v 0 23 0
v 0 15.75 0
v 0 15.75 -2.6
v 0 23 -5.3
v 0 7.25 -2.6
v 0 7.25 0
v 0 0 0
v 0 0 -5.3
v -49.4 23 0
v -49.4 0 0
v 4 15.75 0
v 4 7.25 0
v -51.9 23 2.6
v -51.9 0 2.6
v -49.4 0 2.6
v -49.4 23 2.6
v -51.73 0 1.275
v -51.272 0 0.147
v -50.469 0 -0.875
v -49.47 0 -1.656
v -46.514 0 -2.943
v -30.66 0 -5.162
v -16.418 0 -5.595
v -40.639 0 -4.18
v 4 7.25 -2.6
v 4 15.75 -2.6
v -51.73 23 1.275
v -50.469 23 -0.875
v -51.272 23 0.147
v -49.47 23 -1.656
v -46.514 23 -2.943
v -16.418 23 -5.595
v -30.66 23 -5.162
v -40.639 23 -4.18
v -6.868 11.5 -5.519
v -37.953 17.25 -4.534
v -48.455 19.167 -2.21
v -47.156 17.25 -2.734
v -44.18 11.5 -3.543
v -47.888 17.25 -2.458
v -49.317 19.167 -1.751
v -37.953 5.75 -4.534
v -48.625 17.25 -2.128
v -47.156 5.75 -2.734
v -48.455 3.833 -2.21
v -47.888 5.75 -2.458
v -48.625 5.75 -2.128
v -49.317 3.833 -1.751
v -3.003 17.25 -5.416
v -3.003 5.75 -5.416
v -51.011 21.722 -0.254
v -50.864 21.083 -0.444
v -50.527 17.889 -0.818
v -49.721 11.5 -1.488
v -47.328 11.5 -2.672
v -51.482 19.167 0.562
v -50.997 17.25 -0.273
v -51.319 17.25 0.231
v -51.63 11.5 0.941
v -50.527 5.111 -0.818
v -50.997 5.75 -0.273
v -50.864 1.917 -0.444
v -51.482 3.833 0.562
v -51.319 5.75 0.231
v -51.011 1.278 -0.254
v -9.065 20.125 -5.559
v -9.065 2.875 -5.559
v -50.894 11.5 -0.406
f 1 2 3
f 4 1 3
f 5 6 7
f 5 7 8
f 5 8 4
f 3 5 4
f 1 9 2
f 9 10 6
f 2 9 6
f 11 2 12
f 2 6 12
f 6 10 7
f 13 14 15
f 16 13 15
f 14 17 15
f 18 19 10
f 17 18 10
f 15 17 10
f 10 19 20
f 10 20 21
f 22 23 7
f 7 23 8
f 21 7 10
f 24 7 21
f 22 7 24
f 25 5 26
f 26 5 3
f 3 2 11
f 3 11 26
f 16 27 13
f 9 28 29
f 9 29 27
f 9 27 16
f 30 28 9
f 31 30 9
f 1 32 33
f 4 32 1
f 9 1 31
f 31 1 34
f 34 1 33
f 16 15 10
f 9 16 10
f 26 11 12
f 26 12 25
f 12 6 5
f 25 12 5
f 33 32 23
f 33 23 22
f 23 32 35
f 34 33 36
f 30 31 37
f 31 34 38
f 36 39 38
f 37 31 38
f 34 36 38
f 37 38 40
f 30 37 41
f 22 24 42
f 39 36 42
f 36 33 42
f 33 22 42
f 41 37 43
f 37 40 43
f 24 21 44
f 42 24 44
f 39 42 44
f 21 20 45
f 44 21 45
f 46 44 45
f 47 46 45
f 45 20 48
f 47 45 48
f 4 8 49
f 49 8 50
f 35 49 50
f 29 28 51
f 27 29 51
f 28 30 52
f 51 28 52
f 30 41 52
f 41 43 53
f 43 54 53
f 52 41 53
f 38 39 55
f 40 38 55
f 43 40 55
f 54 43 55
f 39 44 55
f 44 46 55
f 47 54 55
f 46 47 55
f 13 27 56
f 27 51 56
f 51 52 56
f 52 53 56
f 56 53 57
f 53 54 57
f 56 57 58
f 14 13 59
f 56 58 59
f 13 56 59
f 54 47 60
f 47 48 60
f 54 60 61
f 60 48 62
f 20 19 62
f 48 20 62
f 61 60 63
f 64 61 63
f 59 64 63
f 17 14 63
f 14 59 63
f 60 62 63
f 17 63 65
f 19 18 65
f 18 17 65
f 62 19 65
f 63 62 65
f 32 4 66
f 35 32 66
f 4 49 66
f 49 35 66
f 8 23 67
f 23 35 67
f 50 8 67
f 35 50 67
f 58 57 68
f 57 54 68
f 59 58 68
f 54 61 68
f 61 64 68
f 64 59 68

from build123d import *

# Parameters (mm, degrees)
EXTRUDE_1_DEPTH = 23
SKETCH_2_W      = 2.6
SKETCH_2_H      = 8.5
EXTRUDE_2_DEPTH = 4


with BuildPart() as part:
    # Эскиз1 → Бобышка-Вытянуть1 (new body)
    with BuildSketch(Plane(origin=(0, 0, 0), x_dir=(1, 0, 0), z_dir=(0, 1, 0))):
        with BuildLine():
            Line((0, 0), (0, 5.3))
            add(Edge.make_bspline(
                [(0, 5.3), (-7.993874465, 5.66903911), (-41.573220026, 6.372565792), (-51.847847743, 0.984637076), (-51.9, -2.6)],
                knots=[0, 0, 0, 0, 0.717430519, 1, 1, 1, 1], degree=3))
            Line((-51.9, -2.6), (-49.4, -2.6))
            Line((-49.4, -2.6), (-49.4, 0))
            Line((-49.4, 0), (0, 0))
        make_face()
    extrude(amount=EXTRUDE_1_DEPTH)

    # Эскиз2 → Бобышка-Вытянуть2 (add)
    with BuildSketch(Plane(origin=(0, 0, 0), x_dir=(0, 0, -1), z_dir=(1, 0, 0))):
        with Locations((1.3, 11.5)):
            Rectangle(SKETCH_2_W, SKETCH_2_H)
    extrude(amount=EXTRUDE_2_DEPTH)


solid = part.part
